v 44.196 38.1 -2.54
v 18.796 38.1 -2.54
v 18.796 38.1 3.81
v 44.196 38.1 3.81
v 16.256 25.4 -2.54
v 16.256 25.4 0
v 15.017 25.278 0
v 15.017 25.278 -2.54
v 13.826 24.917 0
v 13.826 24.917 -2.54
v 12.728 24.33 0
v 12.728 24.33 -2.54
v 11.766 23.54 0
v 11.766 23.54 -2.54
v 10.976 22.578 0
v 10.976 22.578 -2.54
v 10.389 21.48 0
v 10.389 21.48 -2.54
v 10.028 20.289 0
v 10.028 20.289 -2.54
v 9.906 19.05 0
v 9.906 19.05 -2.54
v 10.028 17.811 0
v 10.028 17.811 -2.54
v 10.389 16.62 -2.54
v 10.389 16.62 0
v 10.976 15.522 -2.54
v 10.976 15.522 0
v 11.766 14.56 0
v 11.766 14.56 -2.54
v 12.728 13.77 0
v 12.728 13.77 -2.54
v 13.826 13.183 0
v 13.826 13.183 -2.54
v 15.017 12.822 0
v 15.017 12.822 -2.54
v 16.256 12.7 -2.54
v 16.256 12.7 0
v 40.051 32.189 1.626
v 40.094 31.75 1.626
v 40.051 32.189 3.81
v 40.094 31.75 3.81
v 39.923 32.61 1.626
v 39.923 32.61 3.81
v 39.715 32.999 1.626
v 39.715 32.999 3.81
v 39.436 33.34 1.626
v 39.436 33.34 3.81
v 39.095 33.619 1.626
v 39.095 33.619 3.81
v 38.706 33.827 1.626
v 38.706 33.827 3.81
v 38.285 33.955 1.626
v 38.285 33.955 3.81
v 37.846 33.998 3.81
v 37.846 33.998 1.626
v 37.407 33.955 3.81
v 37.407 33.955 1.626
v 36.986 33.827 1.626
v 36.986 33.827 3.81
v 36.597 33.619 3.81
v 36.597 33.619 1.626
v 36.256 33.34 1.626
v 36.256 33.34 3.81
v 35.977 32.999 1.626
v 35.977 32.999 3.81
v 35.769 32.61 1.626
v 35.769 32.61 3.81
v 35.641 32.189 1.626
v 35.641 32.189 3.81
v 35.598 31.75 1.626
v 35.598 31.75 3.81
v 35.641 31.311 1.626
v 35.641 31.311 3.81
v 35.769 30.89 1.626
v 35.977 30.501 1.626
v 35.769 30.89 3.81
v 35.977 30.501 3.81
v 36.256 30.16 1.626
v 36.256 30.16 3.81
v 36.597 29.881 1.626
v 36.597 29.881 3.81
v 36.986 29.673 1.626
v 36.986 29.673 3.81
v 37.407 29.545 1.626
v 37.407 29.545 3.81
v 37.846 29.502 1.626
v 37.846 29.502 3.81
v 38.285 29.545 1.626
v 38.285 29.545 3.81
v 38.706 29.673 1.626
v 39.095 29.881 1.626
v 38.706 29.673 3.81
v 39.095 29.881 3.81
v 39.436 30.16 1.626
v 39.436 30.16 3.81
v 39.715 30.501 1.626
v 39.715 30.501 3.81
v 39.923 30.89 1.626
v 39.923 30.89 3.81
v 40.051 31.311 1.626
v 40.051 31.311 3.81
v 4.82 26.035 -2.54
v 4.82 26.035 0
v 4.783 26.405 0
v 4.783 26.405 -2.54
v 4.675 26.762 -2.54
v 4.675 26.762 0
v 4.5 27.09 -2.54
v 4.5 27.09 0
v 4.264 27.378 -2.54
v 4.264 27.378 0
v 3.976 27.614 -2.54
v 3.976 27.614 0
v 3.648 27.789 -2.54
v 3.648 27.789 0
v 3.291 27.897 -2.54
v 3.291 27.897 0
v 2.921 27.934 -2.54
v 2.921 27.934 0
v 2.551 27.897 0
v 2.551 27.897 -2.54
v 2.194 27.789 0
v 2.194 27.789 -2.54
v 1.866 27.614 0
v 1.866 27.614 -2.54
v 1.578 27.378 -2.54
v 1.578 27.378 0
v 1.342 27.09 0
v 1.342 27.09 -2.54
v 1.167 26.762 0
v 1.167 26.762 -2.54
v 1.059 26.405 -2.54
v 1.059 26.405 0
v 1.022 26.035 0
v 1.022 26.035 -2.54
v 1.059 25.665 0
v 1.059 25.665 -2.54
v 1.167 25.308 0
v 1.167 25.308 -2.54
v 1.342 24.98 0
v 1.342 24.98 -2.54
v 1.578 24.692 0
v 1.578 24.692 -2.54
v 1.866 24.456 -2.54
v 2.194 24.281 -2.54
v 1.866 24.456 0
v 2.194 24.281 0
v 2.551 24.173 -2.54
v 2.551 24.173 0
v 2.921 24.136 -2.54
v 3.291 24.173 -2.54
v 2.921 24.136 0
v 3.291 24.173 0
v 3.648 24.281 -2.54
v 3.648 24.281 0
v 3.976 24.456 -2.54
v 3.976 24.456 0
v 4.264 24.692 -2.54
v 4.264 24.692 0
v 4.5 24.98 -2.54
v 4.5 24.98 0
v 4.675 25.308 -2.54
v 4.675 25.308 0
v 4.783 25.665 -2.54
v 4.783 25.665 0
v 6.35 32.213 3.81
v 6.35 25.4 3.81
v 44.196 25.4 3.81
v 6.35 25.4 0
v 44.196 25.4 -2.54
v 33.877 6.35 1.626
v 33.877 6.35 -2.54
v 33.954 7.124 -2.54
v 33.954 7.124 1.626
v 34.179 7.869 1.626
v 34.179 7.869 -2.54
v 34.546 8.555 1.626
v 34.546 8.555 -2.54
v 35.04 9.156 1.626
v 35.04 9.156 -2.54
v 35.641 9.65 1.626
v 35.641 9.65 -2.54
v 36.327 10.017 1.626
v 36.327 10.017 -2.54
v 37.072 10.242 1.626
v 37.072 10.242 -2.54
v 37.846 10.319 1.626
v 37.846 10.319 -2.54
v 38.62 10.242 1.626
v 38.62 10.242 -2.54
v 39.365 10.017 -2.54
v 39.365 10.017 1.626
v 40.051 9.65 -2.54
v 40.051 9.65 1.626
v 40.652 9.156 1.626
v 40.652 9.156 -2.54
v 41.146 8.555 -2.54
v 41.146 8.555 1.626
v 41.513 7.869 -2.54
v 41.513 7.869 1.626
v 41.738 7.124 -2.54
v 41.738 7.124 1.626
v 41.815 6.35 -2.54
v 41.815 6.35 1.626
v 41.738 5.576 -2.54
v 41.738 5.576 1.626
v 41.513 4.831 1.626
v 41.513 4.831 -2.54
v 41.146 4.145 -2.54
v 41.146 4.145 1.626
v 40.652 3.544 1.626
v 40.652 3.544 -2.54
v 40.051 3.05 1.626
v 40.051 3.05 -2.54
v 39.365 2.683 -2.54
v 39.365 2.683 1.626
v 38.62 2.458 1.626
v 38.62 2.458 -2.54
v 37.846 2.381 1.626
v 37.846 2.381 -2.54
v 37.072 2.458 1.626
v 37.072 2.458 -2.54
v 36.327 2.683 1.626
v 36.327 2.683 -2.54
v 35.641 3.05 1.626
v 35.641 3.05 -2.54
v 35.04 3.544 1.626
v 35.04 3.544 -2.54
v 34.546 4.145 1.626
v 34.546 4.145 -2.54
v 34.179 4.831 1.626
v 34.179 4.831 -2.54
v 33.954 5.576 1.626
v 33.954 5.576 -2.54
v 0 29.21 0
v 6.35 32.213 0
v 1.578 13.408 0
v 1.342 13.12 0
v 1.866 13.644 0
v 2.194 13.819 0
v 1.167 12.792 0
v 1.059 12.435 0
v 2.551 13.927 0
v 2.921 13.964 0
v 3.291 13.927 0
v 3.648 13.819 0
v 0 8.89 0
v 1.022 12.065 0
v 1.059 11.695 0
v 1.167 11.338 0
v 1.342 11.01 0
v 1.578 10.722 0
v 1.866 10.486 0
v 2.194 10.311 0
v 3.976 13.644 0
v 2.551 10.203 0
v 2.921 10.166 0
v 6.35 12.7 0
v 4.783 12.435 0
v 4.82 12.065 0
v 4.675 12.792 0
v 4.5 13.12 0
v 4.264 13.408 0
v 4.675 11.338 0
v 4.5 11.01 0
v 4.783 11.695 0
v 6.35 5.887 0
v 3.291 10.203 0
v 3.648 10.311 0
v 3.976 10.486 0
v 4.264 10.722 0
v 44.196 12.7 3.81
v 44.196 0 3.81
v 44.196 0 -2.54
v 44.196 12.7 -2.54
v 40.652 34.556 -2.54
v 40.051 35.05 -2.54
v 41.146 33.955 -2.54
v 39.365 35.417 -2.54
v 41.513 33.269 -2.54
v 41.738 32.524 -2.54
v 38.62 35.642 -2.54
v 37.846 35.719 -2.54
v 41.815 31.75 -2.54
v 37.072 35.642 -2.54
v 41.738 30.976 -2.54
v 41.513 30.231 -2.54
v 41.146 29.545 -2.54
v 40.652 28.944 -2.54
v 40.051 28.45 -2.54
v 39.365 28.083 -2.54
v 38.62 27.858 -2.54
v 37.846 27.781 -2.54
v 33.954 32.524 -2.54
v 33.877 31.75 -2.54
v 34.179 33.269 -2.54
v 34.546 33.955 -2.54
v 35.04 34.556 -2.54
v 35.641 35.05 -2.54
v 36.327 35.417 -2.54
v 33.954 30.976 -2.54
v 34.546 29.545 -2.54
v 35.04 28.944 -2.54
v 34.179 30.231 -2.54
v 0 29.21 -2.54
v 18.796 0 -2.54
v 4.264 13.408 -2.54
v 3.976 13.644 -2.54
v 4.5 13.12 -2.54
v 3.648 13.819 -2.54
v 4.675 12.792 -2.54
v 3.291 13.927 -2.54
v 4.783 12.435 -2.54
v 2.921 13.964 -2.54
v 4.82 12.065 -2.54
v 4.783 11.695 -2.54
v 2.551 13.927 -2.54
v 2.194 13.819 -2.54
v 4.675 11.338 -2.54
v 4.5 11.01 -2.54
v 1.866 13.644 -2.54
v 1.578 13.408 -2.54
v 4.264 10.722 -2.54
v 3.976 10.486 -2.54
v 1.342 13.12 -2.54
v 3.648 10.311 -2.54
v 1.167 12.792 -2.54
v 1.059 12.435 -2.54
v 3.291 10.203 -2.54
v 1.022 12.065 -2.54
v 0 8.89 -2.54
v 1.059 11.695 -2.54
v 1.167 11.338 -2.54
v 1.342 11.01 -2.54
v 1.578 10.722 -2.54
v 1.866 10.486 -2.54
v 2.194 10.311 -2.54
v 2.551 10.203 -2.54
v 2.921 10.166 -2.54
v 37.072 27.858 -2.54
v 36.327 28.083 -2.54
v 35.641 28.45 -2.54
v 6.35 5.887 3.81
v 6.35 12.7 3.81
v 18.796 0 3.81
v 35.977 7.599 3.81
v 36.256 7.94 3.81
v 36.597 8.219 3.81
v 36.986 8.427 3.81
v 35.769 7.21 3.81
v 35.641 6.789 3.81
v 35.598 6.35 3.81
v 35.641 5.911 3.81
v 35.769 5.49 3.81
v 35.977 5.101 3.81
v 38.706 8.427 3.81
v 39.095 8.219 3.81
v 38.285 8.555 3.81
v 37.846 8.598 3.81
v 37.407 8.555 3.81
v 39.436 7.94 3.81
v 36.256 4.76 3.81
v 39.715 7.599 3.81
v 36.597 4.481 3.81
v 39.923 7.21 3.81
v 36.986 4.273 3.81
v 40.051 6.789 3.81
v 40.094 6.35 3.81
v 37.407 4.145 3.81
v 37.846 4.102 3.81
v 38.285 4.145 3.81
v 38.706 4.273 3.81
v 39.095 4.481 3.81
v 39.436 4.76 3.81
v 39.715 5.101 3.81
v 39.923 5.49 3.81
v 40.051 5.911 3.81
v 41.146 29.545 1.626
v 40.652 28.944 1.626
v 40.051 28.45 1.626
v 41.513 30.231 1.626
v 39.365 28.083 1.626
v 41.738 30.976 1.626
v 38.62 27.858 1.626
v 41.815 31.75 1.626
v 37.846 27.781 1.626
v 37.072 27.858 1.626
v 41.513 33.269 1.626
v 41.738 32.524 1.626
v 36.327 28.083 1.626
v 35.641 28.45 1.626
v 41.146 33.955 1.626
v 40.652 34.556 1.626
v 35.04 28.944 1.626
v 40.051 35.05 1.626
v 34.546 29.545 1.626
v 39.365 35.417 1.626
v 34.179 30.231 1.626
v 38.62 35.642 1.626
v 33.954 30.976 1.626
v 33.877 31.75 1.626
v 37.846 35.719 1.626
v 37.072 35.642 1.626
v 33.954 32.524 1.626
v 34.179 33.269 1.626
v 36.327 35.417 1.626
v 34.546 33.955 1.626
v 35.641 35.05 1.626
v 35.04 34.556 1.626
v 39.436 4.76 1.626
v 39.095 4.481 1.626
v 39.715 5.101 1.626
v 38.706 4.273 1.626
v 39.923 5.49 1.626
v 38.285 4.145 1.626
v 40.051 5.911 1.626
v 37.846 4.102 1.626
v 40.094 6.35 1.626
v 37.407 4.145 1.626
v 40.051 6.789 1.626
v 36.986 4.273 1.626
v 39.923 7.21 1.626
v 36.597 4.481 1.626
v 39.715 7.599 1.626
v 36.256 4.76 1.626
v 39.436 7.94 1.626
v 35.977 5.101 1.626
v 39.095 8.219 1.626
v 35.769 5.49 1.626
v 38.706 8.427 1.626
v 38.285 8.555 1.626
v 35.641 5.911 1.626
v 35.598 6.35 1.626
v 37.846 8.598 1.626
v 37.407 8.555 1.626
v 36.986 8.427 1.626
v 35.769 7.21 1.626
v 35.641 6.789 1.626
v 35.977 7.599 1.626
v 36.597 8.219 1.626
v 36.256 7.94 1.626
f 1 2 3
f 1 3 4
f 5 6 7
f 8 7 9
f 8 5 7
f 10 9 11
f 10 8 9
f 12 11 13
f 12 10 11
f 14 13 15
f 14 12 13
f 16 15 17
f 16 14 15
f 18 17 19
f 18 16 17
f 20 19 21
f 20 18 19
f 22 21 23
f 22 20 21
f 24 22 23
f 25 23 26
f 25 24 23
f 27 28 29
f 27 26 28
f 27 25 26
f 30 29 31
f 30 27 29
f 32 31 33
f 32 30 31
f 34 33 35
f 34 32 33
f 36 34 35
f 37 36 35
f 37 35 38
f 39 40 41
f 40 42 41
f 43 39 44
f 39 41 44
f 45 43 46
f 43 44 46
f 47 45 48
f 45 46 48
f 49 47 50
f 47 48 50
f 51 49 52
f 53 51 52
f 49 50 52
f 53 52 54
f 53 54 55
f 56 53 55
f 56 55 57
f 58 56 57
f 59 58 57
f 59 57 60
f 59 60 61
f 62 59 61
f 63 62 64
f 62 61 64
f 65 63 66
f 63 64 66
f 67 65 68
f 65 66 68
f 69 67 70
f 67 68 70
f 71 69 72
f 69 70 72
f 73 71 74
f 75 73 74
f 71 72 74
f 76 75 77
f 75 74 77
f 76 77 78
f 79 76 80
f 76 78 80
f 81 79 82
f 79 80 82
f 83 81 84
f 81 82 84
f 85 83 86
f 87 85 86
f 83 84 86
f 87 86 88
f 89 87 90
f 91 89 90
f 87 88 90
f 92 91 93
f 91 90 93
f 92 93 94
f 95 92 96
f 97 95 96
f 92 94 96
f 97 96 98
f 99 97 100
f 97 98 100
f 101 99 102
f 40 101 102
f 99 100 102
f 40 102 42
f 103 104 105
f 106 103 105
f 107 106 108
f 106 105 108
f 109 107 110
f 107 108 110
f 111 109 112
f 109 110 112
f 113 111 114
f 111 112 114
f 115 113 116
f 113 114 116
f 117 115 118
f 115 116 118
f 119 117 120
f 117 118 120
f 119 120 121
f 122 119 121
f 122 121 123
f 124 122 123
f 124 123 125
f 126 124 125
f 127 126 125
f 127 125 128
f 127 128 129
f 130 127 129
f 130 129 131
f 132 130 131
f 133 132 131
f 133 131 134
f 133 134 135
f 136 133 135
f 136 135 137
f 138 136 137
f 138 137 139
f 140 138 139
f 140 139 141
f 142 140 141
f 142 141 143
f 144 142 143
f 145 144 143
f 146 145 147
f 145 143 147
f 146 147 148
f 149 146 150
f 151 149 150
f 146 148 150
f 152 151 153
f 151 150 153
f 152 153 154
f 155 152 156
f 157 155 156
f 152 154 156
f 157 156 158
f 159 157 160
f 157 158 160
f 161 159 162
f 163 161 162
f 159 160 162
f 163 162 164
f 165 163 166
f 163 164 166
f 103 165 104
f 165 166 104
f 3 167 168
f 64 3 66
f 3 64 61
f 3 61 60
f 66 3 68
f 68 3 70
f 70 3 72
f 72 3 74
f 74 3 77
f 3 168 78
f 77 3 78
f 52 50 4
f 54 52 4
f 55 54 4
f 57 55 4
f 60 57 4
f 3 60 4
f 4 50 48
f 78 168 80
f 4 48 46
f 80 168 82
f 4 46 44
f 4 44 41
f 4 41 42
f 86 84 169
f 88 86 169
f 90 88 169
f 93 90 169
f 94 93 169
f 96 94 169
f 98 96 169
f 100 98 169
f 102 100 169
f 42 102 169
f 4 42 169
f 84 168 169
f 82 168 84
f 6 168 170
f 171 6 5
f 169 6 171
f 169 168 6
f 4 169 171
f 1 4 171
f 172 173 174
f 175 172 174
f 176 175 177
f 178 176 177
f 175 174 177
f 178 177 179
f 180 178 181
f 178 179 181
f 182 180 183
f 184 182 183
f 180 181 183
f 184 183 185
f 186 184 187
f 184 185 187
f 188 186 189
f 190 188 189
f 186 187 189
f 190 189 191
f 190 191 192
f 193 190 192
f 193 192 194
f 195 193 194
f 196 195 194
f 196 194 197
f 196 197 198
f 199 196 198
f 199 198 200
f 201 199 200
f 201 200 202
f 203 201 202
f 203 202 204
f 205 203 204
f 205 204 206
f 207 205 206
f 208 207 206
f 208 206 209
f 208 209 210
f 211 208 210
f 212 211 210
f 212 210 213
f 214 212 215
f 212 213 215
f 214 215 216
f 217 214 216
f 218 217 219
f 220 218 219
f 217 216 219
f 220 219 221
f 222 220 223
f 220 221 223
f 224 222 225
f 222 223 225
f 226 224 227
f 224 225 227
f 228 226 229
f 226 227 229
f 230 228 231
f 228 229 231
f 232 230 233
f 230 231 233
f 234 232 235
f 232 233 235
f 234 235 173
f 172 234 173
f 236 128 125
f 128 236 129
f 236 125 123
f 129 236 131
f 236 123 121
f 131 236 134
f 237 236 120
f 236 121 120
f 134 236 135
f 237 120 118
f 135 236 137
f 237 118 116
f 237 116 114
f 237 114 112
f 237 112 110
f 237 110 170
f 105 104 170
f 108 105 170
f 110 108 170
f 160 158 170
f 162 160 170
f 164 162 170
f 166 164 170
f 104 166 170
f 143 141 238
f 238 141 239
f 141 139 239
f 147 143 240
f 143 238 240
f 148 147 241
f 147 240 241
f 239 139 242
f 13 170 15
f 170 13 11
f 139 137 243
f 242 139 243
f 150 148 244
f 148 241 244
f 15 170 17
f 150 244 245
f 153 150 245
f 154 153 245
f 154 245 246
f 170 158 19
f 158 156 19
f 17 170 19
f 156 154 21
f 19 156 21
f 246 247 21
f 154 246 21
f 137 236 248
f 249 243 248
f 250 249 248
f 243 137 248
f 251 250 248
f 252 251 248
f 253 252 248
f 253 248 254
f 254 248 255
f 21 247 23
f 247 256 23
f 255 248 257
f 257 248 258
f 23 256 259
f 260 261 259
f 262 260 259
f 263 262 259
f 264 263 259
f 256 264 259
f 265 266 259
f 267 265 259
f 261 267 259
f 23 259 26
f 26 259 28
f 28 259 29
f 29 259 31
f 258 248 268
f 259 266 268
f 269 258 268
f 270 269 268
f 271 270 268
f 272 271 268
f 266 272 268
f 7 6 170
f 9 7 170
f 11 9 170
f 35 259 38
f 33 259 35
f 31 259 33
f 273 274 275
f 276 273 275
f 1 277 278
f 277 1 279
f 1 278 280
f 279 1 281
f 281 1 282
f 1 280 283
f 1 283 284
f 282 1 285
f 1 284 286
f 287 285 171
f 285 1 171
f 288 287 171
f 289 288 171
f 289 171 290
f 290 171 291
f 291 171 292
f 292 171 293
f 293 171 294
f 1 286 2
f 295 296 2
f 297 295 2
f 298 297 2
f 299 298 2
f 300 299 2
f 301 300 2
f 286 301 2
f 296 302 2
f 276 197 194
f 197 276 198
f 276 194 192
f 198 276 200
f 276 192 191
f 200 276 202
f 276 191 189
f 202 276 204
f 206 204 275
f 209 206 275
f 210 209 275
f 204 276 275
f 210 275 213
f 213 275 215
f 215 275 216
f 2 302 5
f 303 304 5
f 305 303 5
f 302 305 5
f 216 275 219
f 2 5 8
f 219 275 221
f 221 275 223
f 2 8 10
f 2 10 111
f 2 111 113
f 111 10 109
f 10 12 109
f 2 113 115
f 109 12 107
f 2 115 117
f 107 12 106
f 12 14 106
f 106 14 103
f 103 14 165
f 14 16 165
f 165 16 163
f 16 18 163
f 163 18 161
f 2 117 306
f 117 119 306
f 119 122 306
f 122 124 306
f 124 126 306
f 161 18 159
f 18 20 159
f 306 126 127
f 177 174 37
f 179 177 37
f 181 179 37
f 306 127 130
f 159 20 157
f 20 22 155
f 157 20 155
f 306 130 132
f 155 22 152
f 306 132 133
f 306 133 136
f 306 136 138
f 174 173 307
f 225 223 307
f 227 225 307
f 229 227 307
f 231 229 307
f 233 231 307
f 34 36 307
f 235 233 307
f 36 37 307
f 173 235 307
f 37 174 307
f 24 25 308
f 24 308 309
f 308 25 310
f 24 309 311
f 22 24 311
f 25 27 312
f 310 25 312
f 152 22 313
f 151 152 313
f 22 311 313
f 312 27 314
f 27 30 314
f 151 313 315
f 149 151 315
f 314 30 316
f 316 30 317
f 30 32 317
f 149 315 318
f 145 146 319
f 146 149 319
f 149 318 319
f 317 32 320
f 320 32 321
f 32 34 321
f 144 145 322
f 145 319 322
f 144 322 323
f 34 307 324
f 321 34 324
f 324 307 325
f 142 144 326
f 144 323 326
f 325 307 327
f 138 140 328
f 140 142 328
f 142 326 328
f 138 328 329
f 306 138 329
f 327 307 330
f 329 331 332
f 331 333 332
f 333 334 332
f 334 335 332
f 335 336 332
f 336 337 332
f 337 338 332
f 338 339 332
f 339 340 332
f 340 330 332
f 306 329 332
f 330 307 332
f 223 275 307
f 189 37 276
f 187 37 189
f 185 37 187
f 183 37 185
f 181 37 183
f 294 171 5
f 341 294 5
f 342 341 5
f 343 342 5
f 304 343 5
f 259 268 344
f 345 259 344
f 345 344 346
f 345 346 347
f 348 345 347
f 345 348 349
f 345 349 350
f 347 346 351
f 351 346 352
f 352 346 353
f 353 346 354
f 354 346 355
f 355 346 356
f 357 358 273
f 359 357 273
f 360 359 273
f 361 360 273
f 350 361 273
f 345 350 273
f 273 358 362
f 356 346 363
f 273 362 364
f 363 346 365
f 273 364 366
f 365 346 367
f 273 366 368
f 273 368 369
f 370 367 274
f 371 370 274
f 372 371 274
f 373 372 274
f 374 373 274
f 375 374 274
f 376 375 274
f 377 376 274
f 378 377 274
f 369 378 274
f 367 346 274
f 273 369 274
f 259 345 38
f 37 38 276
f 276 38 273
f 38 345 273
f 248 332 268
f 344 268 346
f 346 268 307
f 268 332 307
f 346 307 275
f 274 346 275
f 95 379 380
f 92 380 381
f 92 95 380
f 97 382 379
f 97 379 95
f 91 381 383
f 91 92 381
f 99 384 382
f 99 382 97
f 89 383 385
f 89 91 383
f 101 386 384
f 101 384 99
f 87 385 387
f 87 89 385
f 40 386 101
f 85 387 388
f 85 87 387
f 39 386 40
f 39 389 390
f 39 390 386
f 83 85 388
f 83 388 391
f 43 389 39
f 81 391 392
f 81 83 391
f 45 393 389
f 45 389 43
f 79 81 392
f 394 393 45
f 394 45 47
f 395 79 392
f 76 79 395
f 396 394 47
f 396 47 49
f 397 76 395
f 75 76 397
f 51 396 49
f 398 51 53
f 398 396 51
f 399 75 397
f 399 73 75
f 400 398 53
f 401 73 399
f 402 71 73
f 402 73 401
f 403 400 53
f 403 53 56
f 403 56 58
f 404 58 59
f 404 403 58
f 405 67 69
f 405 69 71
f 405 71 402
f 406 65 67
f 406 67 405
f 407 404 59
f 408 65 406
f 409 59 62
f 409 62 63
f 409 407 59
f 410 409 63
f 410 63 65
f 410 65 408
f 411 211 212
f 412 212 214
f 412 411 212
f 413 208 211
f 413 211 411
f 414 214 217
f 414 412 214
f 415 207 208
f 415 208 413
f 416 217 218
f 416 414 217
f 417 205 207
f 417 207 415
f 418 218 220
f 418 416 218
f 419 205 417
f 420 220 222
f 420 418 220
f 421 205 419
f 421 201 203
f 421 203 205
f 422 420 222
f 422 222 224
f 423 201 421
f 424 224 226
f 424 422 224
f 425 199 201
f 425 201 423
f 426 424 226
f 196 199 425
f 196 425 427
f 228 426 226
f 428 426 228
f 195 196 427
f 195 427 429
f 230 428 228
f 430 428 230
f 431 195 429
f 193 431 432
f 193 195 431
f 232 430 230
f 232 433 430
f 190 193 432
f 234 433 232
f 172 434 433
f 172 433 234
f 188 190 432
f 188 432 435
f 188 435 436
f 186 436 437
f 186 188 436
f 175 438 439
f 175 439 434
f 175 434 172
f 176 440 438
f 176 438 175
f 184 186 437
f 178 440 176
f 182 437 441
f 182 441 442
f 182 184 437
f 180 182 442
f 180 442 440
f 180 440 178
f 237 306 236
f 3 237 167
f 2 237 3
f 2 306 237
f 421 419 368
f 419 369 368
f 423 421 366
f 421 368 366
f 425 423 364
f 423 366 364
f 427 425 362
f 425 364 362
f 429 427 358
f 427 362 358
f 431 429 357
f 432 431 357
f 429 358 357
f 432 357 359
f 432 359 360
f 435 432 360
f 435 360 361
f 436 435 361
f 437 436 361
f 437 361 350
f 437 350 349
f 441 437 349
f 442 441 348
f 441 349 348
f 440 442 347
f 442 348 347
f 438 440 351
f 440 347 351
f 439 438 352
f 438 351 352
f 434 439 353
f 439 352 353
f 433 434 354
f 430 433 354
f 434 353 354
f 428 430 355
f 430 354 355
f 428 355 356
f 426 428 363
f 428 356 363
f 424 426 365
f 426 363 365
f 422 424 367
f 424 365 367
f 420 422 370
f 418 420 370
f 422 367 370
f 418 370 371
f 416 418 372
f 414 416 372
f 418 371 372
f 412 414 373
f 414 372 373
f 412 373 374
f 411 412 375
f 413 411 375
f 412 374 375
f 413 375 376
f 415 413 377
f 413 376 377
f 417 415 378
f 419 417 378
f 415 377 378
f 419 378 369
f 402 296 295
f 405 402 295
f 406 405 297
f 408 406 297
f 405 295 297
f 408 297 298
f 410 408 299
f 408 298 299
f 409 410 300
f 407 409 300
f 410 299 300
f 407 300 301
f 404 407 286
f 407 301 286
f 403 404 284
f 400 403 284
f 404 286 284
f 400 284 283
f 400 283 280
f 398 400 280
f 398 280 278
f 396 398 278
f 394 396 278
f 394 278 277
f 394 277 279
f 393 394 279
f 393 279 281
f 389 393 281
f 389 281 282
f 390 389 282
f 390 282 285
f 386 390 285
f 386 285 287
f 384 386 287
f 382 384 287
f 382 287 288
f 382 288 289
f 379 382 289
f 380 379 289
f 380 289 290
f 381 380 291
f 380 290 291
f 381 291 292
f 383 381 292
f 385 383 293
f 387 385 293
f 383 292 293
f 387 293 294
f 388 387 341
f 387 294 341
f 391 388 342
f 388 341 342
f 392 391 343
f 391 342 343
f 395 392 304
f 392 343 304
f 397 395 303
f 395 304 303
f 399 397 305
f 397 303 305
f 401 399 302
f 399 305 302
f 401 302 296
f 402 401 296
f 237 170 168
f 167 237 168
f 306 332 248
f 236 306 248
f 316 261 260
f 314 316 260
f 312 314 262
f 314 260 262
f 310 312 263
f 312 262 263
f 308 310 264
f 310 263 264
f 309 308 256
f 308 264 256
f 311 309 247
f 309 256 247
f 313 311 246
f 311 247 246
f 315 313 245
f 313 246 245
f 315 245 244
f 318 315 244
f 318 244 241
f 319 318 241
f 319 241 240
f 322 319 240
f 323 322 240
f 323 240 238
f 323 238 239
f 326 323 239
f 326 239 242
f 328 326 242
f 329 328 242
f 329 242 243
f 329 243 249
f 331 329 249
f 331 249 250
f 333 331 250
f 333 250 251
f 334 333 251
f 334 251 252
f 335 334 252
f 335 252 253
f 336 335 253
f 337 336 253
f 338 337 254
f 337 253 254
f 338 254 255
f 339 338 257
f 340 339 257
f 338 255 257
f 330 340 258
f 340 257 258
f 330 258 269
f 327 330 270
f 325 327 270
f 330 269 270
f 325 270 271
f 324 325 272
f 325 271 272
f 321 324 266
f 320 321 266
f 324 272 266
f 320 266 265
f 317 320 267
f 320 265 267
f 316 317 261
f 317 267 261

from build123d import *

# Parameters (mm, degrees)
BOSS_EXTRUDE1_DEPTH                            = 38.1
CBORE_FOR_8_SOCKET_HEAD_CAP_SCREW1_D           = 4.4958
CBORE_FOR_8_SOCKET_HEAD_CAP_SCREW1_CBORE_D     = 7.9375
CBORE_FOR_8_SOCKET_HEAD_CAP_SCREW1_CBORE_DEPTH = 4.1656
CUT_EXTRUDE1_DEPTH                             = 59.695987222
F_6_CLEARANCE_HOLE1_D                          = 3.7973
CUT_EXTRUDE2_DEPTH                             = 59.695987222
SKETCH6_W                                      = 9.906
SKETCH6_H                                      = 12.7
CUT_EXTRUDE3_DEPTH                             = 3.81


with BuildPart() as part:
    # Sketch1 → Boss-Extrude1 (new body)
    with BuildSketch(Plane(origin=(0, 0, 0), x_dir=(1, 0, 0), z_dir=(0, 1, 0))):
        Polygon((0, 0), (6.35, 0), (6.35, -3.81), (44.196, -3.81), (44.196, -0.814646677), (44.196, 2.54), (0, 2.54), align=None)
    extrude(amount=BOSS_EXTRUDE1_DEPTH)

    # CBORE for #8 Socket Head Cap Screw1 (through all)
    with Locations(Plane(origin=(37.846, 31.75, -2.54), x_dir=(-1, 0, 0), z_dir=(0, 0, -1))):
        with Locations((0, 0), (0, -25.4)):
            CounterBoreHole(CBORE_FOR_8_SOCKET_HEAD_CAP_SCREW1_D / 2, CBORE_FOR_8_SOCKET_HEAD_CAP_SCREW1_CBORE_D / 2, CBORE_FOR_8_SOCKET_HEAD_CAP_SCREW1_CBORE_DEPTH)

    # Sketch3 → Cut-Extrude1 (cut, through all)
    with BuildSketch(Plane(origin=(0, 0, -2.54), x_dir=(-1, 0, 0), z_dir=(0, 0, -1))):
        Polygon((0, 29.21), (-18.796, 38.1), (0, 38.1), align=None)
        Polygon((0, 8.89), (-18.796, 0), (0, 0), align=None)
    extrude(amount=-CUT_EXTRUDE1_DEPTH, mode=Mode.SUBTRACT)

    # #6 Clearance Hole1 (through all)
    with Locations(Plane(origin=(2.921, 26.035, -2.54), x_dir=(-1, 0, 0), z_dir=(0, 0, -1))):
        with Locations((0, 0), (0, -13.97)):
            Hole(F_6_CLEARANCE_HOLE1_D / 2)

    # Sketch5 → Cut-Extrude2 (cut, through all)
    with BuildSketch(Plane(origin=(0, 0, -2.54), x_dir=(-1, 0, 0), z_dir=(0, 0, -1))):
        with BuildLine():
            Line((-16.256, 12.7), (-44.196, 12.7))
            Line((-44.196, 12.7), (-44.196, 25.4))
            Line((-44.196, 25.4), (-16.256, 25.4))
            ThreePointArc((-16.256, 25.4), (-9.906, 19.05), (-16.256, 12.7))
        make_face()
    extrude(amount=-CUT_EXTRUDE2_DEPTH, mode=Mode.SUBTRACT)

    # Sketch6 → Cut-Extrude3 (cut)
    with BuildSketch(Plane.XY.offset(3.81)):
        with Locations((11.303, 19.05)):
            Rectangle(SKETCH6_W, SKETCH6_H)
    extrude(amount=-CUT_EXTRUDE3_DEPTH, mode=Mode.SUBTRACT)


solid = part.part
